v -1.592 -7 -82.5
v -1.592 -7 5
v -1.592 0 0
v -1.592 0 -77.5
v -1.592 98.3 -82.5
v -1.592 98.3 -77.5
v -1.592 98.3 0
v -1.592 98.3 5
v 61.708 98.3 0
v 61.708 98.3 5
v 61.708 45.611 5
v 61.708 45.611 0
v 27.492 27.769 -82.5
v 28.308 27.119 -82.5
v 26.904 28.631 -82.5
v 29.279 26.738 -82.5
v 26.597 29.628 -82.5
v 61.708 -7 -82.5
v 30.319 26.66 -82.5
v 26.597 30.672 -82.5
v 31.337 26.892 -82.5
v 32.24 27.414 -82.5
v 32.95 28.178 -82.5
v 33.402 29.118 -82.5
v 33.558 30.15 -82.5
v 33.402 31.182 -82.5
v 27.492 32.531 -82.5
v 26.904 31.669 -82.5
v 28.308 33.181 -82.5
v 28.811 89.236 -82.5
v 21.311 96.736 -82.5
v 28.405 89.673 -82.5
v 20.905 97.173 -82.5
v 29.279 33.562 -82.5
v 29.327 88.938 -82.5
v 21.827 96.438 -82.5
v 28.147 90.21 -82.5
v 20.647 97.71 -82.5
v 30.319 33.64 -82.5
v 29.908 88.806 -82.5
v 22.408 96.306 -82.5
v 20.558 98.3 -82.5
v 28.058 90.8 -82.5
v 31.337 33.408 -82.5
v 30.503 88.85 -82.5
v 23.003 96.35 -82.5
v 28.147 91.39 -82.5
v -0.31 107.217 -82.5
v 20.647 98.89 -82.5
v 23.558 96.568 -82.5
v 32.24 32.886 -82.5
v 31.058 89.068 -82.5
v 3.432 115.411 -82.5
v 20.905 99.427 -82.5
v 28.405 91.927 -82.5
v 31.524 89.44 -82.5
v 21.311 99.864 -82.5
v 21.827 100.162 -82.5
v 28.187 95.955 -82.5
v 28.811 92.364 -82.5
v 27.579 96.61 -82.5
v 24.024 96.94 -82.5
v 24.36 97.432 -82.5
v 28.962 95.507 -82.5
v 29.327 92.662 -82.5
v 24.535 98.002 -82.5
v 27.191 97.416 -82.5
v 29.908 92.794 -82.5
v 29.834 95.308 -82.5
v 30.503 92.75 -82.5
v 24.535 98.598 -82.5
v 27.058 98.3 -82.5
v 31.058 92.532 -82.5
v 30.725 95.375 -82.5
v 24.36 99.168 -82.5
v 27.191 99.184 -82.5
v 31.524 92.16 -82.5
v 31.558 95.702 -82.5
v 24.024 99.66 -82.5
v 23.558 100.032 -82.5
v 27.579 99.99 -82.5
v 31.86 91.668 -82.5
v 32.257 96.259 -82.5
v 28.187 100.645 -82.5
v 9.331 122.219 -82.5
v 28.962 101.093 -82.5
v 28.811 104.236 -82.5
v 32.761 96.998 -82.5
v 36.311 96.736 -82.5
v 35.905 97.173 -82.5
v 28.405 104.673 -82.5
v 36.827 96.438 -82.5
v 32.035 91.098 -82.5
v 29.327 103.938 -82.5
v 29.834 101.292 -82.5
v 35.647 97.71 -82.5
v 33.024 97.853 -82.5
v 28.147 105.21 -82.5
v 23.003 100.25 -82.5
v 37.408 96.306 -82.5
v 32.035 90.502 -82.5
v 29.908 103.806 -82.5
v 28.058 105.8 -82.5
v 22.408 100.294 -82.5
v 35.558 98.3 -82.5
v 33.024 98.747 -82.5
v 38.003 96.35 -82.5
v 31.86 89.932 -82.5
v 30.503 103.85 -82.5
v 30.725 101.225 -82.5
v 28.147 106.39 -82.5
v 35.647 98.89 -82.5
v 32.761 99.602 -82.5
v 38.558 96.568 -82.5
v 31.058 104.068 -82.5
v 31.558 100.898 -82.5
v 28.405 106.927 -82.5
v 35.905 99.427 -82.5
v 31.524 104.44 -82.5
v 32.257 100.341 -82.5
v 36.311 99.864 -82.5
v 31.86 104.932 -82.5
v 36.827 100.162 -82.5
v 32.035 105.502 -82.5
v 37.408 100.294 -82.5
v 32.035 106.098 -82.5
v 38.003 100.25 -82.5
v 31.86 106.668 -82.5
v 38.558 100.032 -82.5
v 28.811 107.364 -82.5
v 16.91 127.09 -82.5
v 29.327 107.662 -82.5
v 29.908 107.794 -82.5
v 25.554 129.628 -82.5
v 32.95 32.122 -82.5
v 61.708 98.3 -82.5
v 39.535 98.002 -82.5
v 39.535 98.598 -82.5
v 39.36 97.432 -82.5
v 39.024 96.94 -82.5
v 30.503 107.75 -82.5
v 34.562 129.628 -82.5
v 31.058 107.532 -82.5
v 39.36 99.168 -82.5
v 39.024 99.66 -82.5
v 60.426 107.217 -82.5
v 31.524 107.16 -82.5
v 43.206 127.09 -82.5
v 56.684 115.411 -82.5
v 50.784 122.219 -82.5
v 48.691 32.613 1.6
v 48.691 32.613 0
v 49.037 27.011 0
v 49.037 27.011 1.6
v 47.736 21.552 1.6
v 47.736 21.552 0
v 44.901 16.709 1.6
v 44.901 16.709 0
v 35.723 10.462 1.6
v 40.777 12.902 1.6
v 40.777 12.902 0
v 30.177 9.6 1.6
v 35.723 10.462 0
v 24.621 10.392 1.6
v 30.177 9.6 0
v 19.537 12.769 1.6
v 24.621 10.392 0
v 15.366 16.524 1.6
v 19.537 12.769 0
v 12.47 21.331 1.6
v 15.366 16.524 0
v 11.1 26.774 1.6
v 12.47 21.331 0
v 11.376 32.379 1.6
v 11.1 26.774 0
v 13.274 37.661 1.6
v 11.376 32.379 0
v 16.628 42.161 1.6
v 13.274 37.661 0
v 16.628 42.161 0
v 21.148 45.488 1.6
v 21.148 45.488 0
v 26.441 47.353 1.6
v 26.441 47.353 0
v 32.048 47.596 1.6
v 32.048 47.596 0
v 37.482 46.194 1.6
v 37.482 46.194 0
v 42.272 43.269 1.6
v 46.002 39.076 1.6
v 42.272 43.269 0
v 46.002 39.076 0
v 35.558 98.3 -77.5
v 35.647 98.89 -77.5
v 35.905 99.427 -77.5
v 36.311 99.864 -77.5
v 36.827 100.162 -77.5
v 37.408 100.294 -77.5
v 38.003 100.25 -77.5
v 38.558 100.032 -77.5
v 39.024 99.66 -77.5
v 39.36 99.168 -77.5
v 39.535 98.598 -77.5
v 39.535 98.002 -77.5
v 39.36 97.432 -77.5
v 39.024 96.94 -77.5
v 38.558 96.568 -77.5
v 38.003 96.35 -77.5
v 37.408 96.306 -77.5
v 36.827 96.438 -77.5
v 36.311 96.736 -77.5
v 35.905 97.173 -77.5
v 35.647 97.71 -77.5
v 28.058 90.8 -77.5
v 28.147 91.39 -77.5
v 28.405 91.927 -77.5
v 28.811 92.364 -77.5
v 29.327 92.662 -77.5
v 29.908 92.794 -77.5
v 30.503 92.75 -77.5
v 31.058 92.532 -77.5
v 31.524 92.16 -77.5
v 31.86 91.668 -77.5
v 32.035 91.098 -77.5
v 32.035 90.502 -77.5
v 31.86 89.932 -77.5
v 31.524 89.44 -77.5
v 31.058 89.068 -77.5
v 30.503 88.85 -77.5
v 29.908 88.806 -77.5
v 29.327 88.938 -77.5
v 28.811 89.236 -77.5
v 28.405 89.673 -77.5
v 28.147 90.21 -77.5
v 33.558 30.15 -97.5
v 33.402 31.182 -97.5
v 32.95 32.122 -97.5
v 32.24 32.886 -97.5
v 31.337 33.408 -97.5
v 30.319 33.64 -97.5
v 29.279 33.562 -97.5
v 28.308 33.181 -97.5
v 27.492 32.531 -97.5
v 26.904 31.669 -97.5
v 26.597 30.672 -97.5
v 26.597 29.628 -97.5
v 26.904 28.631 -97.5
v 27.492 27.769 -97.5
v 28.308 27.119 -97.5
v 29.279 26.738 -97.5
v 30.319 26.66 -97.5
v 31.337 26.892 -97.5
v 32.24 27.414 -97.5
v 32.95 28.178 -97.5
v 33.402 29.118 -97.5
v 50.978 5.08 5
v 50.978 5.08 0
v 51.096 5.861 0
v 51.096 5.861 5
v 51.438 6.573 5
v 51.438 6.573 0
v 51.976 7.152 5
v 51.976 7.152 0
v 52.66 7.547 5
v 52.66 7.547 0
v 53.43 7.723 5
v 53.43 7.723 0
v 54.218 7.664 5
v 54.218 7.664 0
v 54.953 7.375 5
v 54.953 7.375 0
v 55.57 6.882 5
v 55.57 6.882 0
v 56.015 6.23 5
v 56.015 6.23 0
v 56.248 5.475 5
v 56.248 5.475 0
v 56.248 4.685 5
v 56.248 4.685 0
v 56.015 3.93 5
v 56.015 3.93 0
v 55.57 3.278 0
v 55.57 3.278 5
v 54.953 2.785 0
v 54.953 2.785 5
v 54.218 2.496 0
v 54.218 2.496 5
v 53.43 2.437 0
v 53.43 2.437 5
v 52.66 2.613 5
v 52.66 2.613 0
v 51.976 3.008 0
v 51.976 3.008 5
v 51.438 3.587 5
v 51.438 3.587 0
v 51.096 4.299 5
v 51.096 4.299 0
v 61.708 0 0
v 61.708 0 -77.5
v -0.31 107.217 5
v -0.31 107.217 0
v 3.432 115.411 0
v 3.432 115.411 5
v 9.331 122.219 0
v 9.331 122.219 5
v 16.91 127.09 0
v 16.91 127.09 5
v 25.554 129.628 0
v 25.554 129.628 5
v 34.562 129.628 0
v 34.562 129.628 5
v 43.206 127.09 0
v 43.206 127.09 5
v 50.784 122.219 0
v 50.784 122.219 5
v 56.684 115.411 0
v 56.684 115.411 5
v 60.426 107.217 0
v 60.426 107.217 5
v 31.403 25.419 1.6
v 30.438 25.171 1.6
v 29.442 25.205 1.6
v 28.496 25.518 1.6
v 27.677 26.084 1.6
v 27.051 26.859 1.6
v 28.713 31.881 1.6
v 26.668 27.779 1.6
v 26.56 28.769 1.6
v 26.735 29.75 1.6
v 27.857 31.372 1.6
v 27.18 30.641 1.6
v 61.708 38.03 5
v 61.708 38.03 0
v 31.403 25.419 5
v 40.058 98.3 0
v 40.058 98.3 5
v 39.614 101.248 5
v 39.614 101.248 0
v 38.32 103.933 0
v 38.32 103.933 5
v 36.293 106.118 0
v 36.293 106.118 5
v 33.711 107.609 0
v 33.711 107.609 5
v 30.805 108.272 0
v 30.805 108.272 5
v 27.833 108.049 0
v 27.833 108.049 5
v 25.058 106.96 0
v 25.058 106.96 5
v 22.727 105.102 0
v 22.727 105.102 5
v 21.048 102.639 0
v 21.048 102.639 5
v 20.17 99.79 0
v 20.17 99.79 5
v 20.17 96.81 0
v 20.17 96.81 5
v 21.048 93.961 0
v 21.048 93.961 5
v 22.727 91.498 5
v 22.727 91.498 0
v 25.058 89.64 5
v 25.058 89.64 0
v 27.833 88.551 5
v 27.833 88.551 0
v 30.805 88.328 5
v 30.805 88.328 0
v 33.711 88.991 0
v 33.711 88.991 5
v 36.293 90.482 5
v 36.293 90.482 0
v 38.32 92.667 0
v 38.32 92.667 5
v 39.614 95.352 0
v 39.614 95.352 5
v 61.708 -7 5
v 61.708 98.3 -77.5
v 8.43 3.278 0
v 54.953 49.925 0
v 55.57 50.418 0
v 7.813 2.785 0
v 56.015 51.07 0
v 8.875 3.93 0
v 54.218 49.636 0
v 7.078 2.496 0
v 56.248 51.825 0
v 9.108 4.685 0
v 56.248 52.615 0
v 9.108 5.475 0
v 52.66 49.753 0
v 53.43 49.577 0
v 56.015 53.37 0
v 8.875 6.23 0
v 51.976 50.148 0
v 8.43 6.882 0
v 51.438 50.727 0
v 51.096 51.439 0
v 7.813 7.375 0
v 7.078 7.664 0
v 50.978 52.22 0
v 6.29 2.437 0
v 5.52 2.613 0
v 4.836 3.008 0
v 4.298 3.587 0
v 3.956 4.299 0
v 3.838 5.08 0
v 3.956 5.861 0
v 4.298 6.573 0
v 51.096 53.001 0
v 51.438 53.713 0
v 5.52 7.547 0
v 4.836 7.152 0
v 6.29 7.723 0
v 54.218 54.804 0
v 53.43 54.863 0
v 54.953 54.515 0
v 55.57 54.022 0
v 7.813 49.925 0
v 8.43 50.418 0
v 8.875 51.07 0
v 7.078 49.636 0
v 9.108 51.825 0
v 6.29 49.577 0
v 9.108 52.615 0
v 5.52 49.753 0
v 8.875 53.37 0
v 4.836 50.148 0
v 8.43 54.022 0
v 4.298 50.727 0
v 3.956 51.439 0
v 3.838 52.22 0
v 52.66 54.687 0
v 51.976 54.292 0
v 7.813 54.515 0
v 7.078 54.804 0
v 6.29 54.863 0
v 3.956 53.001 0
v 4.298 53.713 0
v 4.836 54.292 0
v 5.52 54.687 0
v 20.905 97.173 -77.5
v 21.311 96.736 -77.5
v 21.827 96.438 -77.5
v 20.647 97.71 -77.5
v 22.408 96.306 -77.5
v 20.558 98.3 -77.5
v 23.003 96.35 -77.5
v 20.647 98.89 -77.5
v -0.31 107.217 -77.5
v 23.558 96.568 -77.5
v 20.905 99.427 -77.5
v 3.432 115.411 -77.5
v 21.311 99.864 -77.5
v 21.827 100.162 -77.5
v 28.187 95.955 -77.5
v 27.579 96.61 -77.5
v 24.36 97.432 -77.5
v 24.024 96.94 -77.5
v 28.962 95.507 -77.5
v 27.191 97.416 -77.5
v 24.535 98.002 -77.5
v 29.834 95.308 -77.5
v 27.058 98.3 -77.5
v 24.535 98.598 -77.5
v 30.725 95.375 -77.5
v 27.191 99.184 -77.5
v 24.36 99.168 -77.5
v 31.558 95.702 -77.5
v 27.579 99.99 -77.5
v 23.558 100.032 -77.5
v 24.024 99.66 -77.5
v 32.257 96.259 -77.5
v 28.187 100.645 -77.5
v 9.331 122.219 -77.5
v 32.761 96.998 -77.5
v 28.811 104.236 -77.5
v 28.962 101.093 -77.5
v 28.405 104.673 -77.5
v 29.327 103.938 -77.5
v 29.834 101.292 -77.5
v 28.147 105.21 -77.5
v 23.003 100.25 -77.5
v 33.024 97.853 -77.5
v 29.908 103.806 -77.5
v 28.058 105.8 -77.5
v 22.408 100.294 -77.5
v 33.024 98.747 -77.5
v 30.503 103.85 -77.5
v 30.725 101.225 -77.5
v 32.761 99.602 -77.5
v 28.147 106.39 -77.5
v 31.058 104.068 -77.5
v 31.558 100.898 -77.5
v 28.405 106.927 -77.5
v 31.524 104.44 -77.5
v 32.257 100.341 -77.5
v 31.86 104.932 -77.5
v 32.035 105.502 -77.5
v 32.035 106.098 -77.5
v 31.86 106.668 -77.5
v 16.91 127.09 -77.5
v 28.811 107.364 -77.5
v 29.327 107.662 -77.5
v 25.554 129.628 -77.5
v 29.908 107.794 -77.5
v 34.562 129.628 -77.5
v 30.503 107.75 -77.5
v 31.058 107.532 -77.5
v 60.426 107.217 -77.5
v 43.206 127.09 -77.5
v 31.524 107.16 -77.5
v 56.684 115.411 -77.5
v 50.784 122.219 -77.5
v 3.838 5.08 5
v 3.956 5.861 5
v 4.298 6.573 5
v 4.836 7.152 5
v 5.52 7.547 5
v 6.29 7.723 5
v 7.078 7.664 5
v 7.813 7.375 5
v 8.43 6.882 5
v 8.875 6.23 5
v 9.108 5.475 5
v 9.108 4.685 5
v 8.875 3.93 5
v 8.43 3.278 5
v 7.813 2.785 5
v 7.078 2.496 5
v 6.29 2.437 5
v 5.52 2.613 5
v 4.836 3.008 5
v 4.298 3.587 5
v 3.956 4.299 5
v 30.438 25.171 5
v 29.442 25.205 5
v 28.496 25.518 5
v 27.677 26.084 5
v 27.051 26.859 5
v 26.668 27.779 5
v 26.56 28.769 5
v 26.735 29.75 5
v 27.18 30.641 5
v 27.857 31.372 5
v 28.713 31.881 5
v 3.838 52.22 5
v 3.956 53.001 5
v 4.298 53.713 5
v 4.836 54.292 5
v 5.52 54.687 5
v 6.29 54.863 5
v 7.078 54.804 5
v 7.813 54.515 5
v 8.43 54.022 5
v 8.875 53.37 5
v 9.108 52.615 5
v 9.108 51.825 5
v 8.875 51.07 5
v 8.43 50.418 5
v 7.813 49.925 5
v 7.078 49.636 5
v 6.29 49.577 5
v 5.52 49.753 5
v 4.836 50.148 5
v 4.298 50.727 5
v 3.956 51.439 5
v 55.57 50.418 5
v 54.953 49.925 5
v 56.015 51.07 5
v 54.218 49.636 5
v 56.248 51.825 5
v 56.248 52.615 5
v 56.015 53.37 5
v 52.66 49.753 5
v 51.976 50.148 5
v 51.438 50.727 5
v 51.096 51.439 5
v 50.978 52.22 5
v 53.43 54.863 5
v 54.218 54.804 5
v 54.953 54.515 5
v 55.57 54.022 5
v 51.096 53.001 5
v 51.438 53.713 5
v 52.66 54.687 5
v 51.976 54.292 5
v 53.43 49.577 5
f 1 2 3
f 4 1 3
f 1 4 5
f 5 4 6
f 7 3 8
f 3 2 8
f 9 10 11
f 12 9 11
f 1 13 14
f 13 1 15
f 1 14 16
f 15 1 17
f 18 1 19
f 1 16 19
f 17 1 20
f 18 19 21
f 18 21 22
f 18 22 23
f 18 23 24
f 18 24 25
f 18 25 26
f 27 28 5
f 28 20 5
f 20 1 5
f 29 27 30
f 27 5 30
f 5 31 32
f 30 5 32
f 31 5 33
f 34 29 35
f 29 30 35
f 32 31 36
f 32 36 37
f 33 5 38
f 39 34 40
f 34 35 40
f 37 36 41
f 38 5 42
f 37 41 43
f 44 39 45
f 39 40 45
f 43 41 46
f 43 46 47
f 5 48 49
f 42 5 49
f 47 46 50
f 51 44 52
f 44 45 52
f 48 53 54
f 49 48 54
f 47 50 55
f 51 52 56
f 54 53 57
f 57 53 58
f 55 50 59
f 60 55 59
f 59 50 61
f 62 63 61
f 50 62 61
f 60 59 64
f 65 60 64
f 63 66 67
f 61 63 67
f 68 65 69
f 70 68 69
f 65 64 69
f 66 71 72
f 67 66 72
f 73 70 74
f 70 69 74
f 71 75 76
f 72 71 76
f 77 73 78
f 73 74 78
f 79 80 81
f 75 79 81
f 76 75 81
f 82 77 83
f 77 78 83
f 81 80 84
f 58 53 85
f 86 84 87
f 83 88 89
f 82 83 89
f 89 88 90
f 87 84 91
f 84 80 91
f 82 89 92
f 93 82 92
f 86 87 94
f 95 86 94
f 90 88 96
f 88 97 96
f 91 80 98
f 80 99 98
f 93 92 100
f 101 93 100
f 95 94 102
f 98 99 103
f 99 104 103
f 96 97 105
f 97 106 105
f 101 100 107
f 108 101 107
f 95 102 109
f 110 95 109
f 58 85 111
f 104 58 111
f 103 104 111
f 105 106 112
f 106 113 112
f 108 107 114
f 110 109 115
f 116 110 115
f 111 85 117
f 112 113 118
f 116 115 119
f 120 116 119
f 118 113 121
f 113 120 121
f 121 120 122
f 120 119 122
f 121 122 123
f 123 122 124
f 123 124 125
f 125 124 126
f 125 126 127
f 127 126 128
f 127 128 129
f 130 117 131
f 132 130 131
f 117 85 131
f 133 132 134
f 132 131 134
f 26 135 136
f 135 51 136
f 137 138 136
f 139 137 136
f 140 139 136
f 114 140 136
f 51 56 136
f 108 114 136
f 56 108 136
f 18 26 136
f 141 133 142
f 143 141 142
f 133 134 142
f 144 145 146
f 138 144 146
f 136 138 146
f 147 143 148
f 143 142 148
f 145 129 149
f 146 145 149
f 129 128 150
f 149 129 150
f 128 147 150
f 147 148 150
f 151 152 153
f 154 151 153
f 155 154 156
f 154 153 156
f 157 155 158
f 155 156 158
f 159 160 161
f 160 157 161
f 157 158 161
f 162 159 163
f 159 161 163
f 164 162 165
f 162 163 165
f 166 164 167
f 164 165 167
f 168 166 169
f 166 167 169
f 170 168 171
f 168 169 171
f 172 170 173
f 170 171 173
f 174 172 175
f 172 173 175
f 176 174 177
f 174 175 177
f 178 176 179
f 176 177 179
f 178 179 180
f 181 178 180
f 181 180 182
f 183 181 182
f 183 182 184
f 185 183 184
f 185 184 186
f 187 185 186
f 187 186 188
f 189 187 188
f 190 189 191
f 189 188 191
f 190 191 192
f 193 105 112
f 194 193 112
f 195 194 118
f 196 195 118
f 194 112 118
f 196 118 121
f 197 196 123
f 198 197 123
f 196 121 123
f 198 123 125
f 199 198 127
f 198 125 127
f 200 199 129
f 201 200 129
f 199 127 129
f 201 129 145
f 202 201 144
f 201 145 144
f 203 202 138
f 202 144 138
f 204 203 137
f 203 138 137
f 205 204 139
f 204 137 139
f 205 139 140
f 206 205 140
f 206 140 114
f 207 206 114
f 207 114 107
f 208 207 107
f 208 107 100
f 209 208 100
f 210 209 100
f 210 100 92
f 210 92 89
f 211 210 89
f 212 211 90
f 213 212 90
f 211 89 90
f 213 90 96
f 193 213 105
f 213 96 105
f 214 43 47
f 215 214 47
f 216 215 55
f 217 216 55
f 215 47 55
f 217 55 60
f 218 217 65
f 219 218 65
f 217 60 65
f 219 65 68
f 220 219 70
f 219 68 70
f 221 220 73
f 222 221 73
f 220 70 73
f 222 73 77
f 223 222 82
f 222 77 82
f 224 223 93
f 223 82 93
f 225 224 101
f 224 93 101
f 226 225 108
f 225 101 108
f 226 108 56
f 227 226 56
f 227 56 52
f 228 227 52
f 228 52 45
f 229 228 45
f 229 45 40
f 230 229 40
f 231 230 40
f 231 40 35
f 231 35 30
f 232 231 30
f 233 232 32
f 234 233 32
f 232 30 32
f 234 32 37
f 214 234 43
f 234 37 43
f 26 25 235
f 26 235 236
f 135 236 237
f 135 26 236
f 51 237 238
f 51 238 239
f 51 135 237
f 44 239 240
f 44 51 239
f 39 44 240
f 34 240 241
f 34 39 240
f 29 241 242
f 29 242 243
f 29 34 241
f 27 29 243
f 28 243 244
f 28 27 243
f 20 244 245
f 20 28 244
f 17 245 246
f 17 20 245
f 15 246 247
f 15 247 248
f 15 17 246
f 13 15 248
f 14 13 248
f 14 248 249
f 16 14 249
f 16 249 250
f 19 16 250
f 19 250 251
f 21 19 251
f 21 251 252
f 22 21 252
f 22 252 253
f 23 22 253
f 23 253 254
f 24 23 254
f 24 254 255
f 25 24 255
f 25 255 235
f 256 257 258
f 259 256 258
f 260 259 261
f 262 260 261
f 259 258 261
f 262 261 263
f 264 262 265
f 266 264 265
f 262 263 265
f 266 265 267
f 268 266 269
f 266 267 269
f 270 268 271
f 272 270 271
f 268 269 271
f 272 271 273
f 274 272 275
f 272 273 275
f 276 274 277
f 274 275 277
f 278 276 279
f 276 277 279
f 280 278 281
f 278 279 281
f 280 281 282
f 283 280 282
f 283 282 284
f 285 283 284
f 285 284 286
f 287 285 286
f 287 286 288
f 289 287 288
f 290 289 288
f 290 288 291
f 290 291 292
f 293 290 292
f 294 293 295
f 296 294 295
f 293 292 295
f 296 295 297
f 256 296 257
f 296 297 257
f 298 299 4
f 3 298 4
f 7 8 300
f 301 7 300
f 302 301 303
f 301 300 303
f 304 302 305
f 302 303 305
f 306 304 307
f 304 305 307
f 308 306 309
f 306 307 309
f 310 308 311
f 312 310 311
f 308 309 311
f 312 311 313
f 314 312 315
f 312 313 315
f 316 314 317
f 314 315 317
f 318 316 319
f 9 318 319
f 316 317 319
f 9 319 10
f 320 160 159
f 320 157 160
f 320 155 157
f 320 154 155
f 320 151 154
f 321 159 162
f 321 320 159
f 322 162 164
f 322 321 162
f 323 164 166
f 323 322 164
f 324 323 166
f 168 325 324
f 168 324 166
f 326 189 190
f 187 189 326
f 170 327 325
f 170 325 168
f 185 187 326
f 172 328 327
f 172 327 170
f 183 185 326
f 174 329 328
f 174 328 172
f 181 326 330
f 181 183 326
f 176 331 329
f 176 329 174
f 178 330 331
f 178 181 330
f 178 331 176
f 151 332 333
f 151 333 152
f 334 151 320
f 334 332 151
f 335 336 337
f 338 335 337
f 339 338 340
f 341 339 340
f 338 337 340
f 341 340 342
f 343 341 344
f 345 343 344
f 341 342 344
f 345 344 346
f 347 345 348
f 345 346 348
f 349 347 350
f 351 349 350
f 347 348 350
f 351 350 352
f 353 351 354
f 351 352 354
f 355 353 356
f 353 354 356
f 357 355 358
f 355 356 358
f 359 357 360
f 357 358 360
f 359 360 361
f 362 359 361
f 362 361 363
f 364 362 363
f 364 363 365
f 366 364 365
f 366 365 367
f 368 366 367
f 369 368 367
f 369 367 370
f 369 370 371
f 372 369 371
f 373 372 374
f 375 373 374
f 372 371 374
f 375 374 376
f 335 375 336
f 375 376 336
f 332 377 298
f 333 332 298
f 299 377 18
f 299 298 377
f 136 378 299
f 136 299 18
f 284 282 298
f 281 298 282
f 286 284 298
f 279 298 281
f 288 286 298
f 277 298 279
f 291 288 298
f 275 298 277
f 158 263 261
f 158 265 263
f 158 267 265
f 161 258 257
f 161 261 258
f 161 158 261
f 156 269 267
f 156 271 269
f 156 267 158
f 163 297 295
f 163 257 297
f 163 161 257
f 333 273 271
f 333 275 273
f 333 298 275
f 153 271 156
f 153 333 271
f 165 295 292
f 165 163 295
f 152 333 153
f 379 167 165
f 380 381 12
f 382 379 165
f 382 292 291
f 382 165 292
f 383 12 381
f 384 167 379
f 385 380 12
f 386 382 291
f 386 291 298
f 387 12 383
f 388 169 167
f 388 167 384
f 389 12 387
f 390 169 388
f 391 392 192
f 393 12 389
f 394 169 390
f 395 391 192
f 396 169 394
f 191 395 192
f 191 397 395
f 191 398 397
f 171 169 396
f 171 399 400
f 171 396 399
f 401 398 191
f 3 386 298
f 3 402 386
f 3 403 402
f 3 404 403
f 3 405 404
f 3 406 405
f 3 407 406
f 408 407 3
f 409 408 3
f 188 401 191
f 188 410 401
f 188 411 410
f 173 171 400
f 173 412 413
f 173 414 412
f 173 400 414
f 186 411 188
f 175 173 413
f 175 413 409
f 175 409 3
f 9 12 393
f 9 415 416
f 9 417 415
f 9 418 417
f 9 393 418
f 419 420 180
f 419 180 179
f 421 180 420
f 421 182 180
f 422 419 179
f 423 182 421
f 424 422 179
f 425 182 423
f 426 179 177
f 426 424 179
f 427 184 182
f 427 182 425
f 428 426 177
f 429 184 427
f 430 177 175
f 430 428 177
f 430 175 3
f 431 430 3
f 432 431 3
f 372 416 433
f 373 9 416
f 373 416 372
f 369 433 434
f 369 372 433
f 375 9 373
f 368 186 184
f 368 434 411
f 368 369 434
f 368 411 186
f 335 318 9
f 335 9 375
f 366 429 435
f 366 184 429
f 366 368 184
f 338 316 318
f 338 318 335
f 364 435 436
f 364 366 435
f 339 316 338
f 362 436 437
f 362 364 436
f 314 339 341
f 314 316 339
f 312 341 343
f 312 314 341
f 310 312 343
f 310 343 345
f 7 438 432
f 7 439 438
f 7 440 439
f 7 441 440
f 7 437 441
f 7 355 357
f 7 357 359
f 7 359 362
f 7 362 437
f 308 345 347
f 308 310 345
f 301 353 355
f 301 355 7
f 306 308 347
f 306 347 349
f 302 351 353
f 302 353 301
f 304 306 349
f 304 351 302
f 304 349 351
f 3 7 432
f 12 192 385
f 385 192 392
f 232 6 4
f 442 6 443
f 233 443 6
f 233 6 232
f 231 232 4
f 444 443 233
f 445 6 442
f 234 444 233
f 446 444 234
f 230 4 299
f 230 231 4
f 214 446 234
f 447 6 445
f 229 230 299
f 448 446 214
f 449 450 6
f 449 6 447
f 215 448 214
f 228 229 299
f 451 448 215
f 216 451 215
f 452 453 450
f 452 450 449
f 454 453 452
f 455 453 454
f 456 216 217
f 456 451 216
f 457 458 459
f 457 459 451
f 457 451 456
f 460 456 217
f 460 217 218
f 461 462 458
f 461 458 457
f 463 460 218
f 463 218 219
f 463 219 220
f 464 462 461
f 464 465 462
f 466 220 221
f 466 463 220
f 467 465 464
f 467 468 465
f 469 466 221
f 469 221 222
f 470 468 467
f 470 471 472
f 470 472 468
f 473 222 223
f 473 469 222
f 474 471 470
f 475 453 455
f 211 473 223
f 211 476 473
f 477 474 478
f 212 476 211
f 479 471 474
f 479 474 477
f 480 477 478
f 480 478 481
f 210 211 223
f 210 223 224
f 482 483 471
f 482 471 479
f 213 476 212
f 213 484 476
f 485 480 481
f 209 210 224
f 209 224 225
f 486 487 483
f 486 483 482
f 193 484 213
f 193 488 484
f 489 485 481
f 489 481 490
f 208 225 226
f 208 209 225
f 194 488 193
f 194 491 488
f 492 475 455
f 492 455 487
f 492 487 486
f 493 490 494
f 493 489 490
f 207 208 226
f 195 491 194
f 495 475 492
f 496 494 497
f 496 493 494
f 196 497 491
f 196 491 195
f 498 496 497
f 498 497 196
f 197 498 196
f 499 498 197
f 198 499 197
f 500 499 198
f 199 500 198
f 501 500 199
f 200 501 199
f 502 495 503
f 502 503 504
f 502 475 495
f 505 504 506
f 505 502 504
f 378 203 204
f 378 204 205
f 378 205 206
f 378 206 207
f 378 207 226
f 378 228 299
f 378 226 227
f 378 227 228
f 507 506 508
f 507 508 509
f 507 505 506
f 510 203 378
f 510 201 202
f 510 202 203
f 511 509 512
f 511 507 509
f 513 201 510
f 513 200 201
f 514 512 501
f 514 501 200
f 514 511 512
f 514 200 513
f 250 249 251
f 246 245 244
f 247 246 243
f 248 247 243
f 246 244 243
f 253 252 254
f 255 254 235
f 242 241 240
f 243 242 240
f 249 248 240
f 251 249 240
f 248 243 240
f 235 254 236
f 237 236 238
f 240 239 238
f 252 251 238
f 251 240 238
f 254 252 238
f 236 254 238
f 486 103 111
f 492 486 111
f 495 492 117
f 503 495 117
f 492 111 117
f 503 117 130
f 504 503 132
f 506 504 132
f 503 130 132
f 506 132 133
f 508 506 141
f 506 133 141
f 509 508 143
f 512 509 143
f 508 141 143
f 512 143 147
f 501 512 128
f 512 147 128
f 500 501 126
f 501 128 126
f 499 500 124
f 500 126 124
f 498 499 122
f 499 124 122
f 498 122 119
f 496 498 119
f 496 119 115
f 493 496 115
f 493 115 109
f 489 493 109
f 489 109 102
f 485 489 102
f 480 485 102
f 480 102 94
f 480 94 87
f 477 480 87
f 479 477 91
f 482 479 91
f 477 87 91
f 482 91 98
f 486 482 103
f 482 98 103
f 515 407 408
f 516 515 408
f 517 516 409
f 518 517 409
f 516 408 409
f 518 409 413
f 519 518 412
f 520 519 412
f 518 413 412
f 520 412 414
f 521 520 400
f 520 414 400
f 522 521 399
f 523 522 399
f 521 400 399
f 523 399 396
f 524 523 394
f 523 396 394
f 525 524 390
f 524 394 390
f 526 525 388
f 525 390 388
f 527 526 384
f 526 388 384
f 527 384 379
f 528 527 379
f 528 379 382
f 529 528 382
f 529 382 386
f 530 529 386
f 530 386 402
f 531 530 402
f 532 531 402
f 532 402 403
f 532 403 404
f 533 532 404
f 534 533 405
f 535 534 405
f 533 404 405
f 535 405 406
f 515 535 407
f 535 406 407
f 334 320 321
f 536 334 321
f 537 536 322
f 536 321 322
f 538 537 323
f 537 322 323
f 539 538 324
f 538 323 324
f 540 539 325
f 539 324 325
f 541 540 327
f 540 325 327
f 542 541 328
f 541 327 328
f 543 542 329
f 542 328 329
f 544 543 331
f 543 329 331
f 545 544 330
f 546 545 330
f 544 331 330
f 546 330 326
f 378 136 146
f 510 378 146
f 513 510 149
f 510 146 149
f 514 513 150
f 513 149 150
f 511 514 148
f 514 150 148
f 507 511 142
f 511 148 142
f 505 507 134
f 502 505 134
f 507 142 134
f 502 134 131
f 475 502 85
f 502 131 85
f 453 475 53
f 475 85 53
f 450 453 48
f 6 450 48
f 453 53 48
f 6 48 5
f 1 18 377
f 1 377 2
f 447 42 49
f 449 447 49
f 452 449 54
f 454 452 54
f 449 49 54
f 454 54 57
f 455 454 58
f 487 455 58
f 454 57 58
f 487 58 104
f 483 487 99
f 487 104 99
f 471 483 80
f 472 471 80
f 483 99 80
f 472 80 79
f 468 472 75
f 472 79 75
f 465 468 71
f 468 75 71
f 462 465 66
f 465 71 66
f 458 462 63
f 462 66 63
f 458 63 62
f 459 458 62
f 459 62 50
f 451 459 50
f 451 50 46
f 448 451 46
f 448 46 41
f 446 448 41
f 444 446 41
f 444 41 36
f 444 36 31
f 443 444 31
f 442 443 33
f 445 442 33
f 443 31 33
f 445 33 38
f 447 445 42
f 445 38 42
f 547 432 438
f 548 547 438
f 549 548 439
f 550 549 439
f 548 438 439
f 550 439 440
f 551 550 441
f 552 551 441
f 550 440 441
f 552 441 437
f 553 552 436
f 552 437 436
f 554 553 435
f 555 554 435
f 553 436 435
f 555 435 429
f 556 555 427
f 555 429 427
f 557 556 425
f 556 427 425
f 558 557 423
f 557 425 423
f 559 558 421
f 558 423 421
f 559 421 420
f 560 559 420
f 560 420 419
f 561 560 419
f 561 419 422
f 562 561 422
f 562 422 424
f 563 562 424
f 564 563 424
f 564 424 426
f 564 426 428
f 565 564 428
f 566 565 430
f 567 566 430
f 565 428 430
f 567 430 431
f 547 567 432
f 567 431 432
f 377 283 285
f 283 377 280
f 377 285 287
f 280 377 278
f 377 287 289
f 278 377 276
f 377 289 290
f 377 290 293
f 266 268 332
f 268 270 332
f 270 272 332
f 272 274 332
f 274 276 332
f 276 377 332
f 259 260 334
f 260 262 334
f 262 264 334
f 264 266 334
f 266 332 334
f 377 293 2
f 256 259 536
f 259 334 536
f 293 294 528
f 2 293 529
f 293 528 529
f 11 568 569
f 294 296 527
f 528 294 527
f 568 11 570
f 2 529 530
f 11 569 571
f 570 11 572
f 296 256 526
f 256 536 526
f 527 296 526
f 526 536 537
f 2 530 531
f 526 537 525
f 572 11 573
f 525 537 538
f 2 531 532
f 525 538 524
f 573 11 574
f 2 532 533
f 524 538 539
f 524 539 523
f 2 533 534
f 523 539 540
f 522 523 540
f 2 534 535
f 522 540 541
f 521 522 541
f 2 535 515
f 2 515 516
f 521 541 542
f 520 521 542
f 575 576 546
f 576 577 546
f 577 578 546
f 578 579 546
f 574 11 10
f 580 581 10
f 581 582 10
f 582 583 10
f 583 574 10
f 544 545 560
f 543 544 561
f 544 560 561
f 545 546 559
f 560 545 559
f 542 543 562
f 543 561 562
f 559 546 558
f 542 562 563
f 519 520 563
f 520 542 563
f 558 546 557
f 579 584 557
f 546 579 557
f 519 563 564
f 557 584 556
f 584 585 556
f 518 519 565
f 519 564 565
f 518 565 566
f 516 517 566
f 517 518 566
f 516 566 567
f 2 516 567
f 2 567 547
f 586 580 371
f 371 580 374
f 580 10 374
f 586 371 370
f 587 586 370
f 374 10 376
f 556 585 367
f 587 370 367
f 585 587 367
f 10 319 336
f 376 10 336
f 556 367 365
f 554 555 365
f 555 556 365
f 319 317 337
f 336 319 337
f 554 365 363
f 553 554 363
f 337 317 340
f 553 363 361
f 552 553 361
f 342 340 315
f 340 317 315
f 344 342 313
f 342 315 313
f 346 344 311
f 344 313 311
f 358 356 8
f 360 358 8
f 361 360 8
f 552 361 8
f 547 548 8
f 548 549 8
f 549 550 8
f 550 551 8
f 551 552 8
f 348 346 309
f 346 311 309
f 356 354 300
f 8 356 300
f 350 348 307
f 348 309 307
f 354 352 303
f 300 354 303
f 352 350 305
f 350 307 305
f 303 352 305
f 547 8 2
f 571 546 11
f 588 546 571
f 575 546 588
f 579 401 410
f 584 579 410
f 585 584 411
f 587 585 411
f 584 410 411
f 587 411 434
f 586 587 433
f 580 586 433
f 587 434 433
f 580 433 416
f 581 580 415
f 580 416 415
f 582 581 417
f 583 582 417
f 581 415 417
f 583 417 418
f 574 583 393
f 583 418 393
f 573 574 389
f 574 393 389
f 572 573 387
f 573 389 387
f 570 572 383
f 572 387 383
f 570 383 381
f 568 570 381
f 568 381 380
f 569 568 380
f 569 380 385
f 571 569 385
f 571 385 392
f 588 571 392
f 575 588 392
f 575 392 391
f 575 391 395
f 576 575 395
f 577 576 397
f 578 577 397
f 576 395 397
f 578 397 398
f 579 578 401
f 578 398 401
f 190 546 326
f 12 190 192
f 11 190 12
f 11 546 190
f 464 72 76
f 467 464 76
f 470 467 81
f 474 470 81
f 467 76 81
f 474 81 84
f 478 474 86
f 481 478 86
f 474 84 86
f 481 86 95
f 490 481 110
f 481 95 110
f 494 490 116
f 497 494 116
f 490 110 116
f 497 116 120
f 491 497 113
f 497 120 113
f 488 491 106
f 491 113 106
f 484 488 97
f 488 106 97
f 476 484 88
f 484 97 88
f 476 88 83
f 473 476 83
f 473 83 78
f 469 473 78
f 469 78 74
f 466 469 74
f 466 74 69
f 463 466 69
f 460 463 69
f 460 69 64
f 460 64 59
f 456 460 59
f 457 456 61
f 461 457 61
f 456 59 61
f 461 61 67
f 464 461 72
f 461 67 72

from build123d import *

# Parameters (mm, degrees)
BOSS_EXTRUDE1_DEPTH  = 7
BOSS_EXTRUDE2_DEPTH  = 60.3
SKETCH1_5_W          = 63.3
SKETCH1_5_H          = 5
BOSS_EXTRUDE3_DEPTH  = 60.3
SKETCH2_R            = 2.65
SKETCH2_R_2          = 3.5
CUT_EXTRUDE1_DEPTH   = 5
SKETCH2_3_R          = 19.05
CUT_EXTRUDE2_DEPTH   = 1.6
CUT_EXTRUDE3_DEPTH   = 5
BOSS_EXTRUDE6_DEPTH  = 5
BOSS_EXTRUDE10_DEPTH = 5
SKETCH15_R           = 3
SKETCH15_R_2         = 2
CUT_EXTRUDE7_DEPTH   = 5
SKETCH16_R           = 10
CUT_EXTRUDE8_DEPTH   = 5
SKETCH27_W           = 25
SKETCH27_H           = 87.5
CUT_EXTRUDE10_DEPTH  = 7
SKETCH33_R           = 3.5
BOSS_EXTRUDE18_DEPTH = 20


with BuildPart() as part:
    # Sketch1 → Boss-Extrude1 (new body)
    with BuildSketch(Plane(origin=(0, 0, 0), x_dir=(1, 0, 0), z_dir=(0, 1, 0))):
        Polygon((-1.592164976, 82.5), (61.707835024, 82.5), (86.707835024, 82.5), (86.707835024, -5), (61.707835024, -5), (-1.592164976, -5), (-26.592164976, -5), (-26.592164976, 82.5), align=None)
    extrude(amount=-BOSS_EXTRUDE1_DEPTH)

    # Sketch1<3> → Boss-Extrude2 (add)
    with BuildSketch(Plane(origin=(0, 0, 0), x_dir=(1, 0, 0), z_dir=(0, 1, 0))):
        Polygon((1.407835024, 0), (58.707835024, 0), (61.707835024, 0), (61.707835024, -5), (-1.592164976, -5), (-1.592164976, 0), align=None)
    extrude(amount=BOSS_EXTRUDE2_DEPTH)

    # Sketch1<5> → Boss-Extrude3 (add)
    with BuildSketch(Plane(origin=(0, 0, 0), x_dir=(1, 0, 0), z_dir=(0, 1, 0))):
        with Locations((30.057835024, 80)):
            Rectangle(SKETCH1_5_W, SKETCH1_5_H)
    extrude(amount=BOSS_EXTRUDE3_DEPTH)

    # Sketch2 → Cut-Extrude1 (cut)
    with BuildSketch(Plane(origin=(0, 0, 0), x_dir=(-1, 0, 0), z_dir=(0, 0, -1))):
        with Locations((-6.487835024, 52.22)):
            Circle(SKETCH2_R)
        with Locations((-53.627835024, 52.22)):
            Circle(SKETCH2_R)
        with Locations((-53.627835024, 5.08)):
            Circle(SKETCH2_R)
        with Locations((-6.487835024, 5.08)):
            Circle(SKETCH2_R)
        with Locations((-30.057835024, 28.65)):
            Circle(SKETCH2_R_2)
    extrude(amount=-CUT_EXTRUDE1_DEPTH, mode=Mode.SUBTRACT)

    # Sketch2<3> → Cut-Extrude2 (cut)
    with BuildSketch(Plane(origin=(0, 0, 0), x_dir=(-1, 0, 0), z_dir=(0, 0, -1))):
        with Locations((-30.057835024, 28.65)):
            Circle(SKETCH2_3_R)
    extrude(amount=-CUT_EXTRUDE2_DEPTH, mode=Mode.SUBTRACT)

    # Sketch4 → Cut-Extrude3 (cut)
    with BuildSketch(Plane.XY.offset(5)):
        Polygon((28.713159107, 31.881384638), (61.707835024, 45.611457374), (61.707835024, 38.029568262), (31.402510942, 25.418615362), align=None)
    extrude(amount=-CUT_EXTRUDE3_DEPTH, mode=Mode.SUBTRACT)

    # Sketch7 → Boss-Extrude6 (add)
    with BuildSketch(Plane(origin=(0, 0, -82.5), x_dir=(-1, 0, 0), z_dir=(0, 0, -1))):
        with BuildLine():
            Line((-61.707835024, 60.3), (-61.707835024, 98.3))
            ThreePointArc((-61.707835024, 98.3), (-30.057835024, 129.95), (1.592164976, 98.3))
            Line((1.592164976, 98.3), (1.592164976, 60.3))
            Line((1.592164976, 60.3), (-61.707835024, 60.3))
        make_face()
    extrude(amount=-BOSS_EXTRUDE6_DEPTH)

    # Sketch8 → Boss-Extrude10 (add)
    with BuildSketch(Plane.XY.offset(5)):
        with BuildLine():
            Line((-1.592164976, 60.3), (-1.592164976, 98.3))
            ThreePointArc((-1.592164976, 98.3), (30.057835024, 129.95), (61.707835024, 98.3))
            Line((61.707835024, 98.3), (61.707835024, 60.3))
            Line((61.707835024, 60.3), (-1.592164976, 60.3))
        make_face()
    extrude(amount=-BOSS_EXTRUDE10_DEPTH)

    # Sketch15 → Cut-Extrude7 (cut)
    with BuildSketch(Plane(origin=(0, 0, -82.5), x_dir=(-1, 0, 0), z_dir=(0, 0, -1))):
        with Locations((-30.057835024, 98.3)):
            Circle(SKETCH15_R)
        with Locations((-30.057835024, 105.8)):
            Circle(SKETCH15_R_2)
        with Locations((-22.557835024, 98.3)):
            Circle(SKETCH15_R_2)
        with Locations((-30.057835024, 90.8)):
            Circle(SKETCH15_R_2)
        with Locations((-37.557835024, 98.3)):
            Circle(SKETCH15_R_2)
    extrude(amount=-CUT_EXTRUDE7_DEPTH, mode=Mode.SUBTRACT)

    # Sketch16 → Cut-Extrude8 (cut)
    with BuildSketch(Plane.XY.offset(5)):
        with Locations((30.057835024, 98.3)):
            Circle(SKETCH16_R)
    extrude(amount=-CUT_EXTRUDE8_DEPTH, mode=Mode.SUBTRACT)

    # Sketch27 → Cut-Extrude10 (cut)
    with BuildSketch(Plane(origin=(0, 0, 0), x_dir=(1, 0, 0), z_dir=(0, 1, 0))):
        with Locations((74.207835024, 38.75)):
            Rectangle(SKETCH27_W, SKETCH27_H)
        with Locations((-14.092164976, 38.75)):
            Rectangle(SKETCH27_W, SKETCH27_H)
    extrude(amount=-CUT_EXTRUDE10_DEPTH, mode=Mode.SUBTRACT)

    # Sketch33 → Boss-Extrude18 (add)
    with BuildSketch(Plane.XY.offset(-77.5)):
        with Locations((30.057835024, 30.15)):
            Circle(SKETCH33_R)
    extrude(amount=-BOSS_EXTRUDE18_DEPTH)


solid = part.part
